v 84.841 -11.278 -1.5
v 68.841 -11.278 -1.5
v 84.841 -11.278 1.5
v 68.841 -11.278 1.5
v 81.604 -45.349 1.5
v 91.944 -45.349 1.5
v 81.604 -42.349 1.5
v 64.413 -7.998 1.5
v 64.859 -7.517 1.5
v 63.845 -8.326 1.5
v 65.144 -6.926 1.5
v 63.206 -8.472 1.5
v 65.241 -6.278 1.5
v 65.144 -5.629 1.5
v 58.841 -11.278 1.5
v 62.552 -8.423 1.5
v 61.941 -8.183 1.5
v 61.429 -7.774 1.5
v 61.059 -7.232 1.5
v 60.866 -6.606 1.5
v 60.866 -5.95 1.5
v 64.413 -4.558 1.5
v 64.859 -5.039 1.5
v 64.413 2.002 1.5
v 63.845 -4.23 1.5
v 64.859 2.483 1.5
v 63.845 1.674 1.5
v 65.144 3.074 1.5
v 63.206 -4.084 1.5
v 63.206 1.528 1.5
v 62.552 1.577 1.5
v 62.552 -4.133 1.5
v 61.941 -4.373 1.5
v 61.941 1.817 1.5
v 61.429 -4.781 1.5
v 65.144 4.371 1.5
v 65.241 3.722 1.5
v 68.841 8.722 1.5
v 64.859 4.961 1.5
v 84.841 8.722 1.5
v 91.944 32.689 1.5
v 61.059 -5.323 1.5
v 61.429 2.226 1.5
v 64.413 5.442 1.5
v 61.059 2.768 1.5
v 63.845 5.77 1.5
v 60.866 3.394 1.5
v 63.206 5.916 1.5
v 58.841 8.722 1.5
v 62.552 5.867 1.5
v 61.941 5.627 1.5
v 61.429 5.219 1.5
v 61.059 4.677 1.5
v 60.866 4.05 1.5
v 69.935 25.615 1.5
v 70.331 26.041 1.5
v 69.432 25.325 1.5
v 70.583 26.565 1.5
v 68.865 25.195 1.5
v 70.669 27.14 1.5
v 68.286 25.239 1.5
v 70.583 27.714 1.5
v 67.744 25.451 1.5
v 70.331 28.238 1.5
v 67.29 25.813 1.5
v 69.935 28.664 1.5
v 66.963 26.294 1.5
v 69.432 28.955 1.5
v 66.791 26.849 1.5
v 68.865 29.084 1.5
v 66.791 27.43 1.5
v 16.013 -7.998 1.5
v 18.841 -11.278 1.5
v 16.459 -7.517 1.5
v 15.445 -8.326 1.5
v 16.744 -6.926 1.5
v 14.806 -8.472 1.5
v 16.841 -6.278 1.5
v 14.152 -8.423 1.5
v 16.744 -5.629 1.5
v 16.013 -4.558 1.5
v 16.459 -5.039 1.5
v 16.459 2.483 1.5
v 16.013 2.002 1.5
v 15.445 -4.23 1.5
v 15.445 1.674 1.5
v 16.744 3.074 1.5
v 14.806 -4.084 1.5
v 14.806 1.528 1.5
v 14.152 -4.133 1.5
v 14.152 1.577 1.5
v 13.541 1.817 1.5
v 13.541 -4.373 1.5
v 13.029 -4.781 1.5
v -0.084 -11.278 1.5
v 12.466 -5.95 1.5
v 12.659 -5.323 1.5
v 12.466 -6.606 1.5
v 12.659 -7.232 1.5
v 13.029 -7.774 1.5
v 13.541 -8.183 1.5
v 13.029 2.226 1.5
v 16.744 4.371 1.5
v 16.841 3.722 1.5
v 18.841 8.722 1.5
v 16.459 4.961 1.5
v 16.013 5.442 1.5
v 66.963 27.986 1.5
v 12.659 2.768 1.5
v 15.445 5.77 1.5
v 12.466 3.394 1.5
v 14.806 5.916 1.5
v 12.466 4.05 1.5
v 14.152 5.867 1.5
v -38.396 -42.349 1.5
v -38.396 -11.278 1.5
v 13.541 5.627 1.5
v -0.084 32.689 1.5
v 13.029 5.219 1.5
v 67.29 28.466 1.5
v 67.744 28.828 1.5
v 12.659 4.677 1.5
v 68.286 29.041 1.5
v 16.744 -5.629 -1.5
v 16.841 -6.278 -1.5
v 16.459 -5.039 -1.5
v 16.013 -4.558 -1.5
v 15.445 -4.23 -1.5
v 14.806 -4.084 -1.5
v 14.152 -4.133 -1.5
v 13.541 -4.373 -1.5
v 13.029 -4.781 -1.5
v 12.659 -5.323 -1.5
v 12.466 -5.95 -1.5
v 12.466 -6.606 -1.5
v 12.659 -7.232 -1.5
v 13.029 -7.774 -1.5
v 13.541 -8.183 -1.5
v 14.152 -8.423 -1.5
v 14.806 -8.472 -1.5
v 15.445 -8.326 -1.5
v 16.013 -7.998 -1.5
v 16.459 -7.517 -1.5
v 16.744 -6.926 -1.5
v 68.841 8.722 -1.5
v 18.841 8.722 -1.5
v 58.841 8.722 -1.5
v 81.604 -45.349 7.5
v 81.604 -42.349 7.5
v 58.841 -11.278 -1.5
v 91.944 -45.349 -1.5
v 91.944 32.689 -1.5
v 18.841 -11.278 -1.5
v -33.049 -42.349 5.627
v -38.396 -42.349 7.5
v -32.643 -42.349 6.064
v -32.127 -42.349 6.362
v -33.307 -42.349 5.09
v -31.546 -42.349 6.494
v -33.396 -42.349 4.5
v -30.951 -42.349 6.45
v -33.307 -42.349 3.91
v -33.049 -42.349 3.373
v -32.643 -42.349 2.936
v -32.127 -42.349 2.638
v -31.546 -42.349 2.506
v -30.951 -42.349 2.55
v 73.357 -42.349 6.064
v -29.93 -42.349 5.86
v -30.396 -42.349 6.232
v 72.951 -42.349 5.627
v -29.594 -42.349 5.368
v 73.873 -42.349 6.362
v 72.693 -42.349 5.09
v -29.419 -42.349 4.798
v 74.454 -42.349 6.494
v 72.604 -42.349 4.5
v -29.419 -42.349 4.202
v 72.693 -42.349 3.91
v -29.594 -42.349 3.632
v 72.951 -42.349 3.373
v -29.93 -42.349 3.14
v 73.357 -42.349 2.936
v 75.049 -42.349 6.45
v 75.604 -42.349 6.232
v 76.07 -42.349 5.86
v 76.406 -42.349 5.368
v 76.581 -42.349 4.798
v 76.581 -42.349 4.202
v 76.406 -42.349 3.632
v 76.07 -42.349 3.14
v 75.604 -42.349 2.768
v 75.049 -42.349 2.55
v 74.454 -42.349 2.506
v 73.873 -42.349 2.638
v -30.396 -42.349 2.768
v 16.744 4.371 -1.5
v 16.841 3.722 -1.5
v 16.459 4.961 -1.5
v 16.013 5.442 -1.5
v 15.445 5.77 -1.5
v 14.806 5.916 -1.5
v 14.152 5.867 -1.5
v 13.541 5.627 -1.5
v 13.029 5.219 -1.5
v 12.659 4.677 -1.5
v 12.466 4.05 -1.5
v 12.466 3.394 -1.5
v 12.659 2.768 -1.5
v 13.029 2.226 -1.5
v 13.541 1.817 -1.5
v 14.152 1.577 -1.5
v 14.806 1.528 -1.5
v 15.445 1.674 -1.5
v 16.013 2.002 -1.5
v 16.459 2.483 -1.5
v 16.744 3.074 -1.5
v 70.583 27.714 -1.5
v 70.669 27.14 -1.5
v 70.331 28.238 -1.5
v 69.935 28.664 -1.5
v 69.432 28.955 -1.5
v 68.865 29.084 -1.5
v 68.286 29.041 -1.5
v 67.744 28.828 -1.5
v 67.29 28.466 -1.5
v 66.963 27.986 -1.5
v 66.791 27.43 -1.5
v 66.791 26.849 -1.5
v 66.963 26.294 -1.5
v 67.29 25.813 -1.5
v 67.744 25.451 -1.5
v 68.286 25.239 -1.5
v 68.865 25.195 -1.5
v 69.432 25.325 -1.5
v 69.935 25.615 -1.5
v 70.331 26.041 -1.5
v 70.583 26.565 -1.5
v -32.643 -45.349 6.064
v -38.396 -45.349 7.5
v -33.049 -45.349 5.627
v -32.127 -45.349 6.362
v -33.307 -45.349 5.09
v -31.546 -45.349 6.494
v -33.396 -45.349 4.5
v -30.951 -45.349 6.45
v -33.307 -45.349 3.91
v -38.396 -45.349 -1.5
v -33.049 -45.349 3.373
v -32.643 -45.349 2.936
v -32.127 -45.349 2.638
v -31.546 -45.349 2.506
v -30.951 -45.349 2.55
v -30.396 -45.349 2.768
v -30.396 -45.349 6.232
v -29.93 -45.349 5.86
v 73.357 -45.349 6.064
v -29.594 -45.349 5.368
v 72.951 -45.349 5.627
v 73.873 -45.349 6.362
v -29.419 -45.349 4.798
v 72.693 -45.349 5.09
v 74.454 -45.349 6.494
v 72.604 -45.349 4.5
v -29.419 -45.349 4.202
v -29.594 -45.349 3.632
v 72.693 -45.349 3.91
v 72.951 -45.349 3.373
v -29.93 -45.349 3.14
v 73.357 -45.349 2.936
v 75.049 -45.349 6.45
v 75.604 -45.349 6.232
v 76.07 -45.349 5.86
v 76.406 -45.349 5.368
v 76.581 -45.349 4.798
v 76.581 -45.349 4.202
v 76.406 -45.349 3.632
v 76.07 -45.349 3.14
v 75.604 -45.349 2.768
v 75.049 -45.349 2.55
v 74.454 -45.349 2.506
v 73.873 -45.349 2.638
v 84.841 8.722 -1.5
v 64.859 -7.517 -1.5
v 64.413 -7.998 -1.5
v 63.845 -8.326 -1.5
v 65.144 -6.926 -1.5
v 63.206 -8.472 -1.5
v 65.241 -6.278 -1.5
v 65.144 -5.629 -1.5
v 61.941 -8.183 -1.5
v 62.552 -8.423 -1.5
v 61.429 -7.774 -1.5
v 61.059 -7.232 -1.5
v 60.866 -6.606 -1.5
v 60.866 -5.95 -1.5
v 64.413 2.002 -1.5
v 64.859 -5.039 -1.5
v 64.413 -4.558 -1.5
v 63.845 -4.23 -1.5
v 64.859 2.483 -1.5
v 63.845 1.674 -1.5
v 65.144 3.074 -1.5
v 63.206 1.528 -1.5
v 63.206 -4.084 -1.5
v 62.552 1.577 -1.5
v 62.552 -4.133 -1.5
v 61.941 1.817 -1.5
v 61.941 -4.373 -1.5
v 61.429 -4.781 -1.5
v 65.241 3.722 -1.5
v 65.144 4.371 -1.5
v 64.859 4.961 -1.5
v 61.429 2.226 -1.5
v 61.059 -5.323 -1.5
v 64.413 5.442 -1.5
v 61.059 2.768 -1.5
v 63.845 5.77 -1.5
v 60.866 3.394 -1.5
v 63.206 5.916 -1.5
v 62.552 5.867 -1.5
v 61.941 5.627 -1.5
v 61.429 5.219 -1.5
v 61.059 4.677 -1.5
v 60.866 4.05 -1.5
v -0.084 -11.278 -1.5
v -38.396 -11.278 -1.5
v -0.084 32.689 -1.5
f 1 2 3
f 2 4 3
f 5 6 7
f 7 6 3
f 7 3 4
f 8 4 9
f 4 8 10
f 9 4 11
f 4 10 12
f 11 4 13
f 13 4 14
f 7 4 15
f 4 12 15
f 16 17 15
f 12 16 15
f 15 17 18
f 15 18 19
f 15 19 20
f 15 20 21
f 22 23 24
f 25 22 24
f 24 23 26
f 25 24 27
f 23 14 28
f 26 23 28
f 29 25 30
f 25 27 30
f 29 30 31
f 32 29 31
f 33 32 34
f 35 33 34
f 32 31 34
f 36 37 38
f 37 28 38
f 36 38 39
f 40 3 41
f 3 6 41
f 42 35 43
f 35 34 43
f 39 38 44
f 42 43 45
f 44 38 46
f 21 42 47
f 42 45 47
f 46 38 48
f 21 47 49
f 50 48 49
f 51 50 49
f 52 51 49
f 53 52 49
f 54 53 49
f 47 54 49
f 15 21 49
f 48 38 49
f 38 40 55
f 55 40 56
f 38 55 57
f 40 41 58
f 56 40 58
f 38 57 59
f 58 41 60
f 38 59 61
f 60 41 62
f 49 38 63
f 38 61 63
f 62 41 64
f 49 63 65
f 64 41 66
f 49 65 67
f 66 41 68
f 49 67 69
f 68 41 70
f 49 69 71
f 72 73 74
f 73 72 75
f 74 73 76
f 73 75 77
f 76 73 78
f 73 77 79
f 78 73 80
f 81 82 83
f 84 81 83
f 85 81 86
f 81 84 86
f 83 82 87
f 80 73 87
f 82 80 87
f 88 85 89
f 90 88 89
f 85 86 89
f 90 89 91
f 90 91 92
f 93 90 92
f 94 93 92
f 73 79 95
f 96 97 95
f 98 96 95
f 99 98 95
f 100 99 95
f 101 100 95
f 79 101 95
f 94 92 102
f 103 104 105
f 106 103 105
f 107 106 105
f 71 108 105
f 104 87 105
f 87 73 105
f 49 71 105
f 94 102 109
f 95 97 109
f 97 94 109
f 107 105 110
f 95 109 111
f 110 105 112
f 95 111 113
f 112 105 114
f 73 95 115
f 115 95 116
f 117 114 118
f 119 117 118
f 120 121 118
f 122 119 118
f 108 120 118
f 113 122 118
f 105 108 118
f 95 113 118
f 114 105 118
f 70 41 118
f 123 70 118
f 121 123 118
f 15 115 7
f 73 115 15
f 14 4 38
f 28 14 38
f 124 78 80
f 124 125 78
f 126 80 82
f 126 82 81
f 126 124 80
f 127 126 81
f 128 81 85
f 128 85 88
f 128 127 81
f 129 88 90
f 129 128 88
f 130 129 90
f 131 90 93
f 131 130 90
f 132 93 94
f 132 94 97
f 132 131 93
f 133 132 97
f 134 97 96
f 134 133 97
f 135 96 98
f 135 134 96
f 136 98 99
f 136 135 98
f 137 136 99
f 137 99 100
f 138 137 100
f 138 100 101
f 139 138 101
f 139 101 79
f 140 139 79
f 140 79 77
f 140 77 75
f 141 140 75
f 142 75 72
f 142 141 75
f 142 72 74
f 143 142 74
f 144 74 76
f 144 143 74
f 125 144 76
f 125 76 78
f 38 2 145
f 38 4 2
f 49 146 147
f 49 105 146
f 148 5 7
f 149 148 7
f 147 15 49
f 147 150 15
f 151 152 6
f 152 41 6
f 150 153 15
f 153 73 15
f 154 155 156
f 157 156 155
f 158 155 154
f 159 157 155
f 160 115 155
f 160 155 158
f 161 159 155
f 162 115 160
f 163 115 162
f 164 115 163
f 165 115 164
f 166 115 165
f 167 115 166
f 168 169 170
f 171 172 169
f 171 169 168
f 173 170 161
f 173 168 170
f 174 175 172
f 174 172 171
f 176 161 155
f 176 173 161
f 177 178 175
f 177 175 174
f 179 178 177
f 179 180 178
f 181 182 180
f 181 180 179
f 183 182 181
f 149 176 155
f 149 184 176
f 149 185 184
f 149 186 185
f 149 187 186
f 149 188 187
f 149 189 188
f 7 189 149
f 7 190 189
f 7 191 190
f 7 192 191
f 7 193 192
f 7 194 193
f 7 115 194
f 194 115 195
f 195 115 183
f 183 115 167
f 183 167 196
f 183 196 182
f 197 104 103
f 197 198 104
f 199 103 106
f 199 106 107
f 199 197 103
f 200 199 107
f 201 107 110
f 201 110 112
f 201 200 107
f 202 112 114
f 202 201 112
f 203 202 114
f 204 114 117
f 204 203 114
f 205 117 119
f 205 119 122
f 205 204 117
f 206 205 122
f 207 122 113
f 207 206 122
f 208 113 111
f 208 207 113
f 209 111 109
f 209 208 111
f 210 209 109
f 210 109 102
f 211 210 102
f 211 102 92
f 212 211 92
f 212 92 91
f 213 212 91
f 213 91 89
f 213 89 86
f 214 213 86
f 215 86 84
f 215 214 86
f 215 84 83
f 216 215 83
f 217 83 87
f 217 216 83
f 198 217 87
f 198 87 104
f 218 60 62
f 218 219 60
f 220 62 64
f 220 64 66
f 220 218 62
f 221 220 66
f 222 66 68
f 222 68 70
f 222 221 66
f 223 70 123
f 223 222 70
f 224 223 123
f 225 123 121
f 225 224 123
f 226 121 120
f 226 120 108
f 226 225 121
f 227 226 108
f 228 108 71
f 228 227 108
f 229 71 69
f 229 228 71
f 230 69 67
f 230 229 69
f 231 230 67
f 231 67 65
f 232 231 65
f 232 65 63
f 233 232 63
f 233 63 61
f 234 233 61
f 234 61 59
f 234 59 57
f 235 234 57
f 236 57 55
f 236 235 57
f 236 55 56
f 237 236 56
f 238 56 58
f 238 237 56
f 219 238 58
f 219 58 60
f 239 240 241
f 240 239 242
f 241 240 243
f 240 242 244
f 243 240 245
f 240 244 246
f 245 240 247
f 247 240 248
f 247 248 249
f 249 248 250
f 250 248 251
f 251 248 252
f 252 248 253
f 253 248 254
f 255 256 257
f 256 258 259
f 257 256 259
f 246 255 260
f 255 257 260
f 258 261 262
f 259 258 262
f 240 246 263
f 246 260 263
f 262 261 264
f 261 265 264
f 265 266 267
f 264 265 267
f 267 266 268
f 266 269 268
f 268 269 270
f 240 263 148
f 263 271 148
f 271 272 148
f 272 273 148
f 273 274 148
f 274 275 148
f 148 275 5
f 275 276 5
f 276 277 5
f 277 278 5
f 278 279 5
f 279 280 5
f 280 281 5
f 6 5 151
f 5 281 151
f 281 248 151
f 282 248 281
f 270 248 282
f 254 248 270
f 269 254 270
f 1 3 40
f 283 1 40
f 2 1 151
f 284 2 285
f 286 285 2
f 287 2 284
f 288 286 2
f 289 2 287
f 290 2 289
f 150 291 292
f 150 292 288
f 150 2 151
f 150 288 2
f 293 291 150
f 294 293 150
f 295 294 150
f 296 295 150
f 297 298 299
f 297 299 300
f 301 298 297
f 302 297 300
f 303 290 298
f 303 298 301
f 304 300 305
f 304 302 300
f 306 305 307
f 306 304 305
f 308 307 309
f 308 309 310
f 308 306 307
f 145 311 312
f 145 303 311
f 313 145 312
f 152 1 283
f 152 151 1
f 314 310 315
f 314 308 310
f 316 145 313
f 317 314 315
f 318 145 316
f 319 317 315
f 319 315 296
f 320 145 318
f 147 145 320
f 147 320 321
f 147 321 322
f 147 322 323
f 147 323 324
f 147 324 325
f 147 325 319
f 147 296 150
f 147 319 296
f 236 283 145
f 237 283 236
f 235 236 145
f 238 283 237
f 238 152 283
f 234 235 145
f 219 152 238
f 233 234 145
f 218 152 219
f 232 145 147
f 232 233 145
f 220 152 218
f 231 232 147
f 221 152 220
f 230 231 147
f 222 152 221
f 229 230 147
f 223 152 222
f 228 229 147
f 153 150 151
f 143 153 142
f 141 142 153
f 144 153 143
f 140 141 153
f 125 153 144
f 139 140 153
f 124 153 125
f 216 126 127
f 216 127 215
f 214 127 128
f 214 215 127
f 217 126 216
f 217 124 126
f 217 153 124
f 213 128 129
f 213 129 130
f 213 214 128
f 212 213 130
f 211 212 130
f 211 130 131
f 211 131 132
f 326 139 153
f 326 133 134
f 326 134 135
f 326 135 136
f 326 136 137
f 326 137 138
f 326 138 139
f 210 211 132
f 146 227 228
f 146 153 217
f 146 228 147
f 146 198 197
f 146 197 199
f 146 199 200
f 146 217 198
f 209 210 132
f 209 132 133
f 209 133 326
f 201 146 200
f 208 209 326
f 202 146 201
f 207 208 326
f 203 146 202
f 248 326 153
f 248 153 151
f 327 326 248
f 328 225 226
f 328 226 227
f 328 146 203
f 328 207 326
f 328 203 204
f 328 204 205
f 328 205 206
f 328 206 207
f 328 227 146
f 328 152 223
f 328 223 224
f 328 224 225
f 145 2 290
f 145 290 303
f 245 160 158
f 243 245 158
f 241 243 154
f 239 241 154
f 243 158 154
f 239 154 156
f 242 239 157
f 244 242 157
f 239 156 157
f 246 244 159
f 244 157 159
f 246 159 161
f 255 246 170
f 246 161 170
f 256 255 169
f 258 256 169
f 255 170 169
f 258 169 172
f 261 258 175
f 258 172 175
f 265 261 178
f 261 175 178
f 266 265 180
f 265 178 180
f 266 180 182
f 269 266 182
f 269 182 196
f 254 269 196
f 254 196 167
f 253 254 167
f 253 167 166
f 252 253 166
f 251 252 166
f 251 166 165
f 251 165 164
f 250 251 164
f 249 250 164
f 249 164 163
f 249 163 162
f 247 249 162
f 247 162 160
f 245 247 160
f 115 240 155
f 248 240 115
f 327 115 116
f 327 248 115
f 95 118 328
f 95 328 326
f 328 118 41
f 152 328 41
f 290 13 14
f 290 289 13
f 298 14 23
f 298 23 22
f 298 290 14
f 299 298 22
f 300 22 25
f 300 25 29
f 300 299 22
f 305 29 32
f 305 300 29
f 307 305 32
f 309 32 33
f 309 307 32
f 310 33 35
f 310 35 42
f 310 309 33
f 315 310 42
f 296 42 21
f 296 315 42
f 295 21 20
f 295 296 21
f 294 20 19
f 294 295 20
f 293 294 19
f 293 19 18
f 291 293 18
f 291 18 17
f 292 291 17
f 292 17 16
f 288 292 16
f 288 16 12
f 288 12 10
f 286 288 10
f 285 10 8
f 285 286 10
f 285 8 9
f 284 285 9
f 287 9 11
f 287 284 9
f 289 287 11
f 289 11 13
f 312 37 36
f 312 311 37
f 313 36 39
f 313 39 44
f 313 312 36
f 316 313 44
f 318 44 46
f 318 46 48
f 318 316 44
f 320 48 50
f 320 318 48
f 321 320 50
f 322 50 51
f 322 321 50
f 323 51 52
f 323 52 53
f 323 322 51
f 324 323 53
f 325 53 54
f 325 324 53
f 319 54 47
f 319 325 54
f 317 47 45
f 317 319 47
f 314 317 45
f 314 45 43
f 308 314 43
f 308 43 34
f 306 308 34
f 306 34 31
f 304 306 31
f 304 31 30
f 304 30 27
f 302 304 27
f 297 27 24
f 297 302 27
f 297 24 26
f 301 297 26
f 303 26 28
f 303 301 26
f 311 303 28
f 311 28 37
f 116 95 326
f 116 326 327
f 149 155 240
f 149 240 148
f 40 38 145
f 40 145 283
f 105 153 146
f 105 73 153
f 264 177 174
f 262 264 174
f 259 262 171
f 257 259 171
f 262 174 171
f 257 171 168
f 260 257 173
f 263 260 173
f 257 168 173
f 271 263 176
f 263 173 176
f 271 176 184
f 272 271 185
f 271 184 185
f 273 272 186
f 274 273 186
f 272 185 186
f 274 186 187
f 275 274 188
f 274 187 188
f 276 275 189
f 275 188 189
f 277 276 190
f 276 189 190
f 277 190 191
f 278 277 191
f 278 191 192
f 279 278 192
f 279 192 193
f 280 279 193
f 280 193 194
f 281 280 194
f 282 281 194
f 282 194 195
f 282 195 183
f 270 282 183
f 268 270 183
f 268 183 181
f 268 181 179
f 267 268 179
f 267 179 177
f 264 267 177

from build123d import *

# Parameters (mm, degrees)
SKETCH_1_R          = 2.2
SKETCH_1_R_2        = 1.95
SKETCH_1_W          = 40
SKETCH_1_H          = 20
SKETCH_1_W_2        = 16
EXTRUDE_1_DEPTH     = 1.5
SKETCH_2_W          = 120
SKETCH_2_H          = 3
EXTRUDE_2_DEPTH     = 6
SKETCH_3_R          = 2
CUT_EXTRUDE_1_DEPTH = 6


with BuildPart() as part:
    # 草图1 → 凸台-拉伸1 (new, symmetric)
    with BuildSketch(Plane.XY):
        Polygon((-0.084238348, 32.688738727), (91.943563532, 32.688738727), (91.943563532, -45.349139123), (-38.396296283, -45.349139123), (-38.396296283, -11.277844067), (-17.084238348, -11.277844067), (-0.084238348, -11.277844067), (-0.084238348, 8.722155933), align=None)
        with Locations((14.641461985, 3.722155933)):
            Circle(SKETCH_1_R, mode=Mode.SUBTRACT)
        with Locations((14.641461985, -6.277844067)):
            Circle(SKETCH_1_R, mode=Mode.SUBTRACT)
        with Locations((63.041461985, 3.722155933)):
            Circle(SKETCH_1_R, mode=Mode.SUBTRACT)
        with Locations((63.041461985, -6.277844067)):
            Circle(SKETCH_1_R, mode=Mode.SUBTRACT)
        with Locations((68.719491165, 27.139714958)):
            Circle(SKETCH_1_R_2, mode=Mode.SUBTRACT)
        with Locations((38.841461985, -1.277844067)):
            Rectangle(SKETCH_1_W, SKETCH_1_H, mode=Mode.SUBTRACT)
        with Locations((76.841461985, -1.277844067)):
            Rectangle(SKETCH_1_W_2, SKETCH_1_H, mode=Mode.SUBTRACT)
    extrude(amount=EXTRUDE_1_DEPTH, both=True)

    # 草图2 → 凸台-拉伸2 (add)
    with BuildSketch(Plane.XY.offset(1.5)):
        with Locations((21.603703717, -43.849139123)):
            Rectangle(SKETCH_2_W, SKETCH_2_H)
    extrude(amount=EXTRUDE_2_DEPTH)

    # 草图3 → 切除-拉伸1 (cut)
    with BuildSketch(Plane(origin=(0, -42.349139123, 0), x_dir=(1, 0, 0), z_dir=(0, 1, 0))):
        with Locations(Location((-31.396296283, -4.5, 0), (0, 0, 180))):
            Circle(SKETCH_3_R)
        with Locations(Location((74.603703717, -4.5, 0), (0, 0, 180))):
            Circle(SKETCH_3_R)
    extrude(amount=-CUT_EXTRUDE_1_DEPTH, mode=Mode.SUBTRACT)


solid = part.part
